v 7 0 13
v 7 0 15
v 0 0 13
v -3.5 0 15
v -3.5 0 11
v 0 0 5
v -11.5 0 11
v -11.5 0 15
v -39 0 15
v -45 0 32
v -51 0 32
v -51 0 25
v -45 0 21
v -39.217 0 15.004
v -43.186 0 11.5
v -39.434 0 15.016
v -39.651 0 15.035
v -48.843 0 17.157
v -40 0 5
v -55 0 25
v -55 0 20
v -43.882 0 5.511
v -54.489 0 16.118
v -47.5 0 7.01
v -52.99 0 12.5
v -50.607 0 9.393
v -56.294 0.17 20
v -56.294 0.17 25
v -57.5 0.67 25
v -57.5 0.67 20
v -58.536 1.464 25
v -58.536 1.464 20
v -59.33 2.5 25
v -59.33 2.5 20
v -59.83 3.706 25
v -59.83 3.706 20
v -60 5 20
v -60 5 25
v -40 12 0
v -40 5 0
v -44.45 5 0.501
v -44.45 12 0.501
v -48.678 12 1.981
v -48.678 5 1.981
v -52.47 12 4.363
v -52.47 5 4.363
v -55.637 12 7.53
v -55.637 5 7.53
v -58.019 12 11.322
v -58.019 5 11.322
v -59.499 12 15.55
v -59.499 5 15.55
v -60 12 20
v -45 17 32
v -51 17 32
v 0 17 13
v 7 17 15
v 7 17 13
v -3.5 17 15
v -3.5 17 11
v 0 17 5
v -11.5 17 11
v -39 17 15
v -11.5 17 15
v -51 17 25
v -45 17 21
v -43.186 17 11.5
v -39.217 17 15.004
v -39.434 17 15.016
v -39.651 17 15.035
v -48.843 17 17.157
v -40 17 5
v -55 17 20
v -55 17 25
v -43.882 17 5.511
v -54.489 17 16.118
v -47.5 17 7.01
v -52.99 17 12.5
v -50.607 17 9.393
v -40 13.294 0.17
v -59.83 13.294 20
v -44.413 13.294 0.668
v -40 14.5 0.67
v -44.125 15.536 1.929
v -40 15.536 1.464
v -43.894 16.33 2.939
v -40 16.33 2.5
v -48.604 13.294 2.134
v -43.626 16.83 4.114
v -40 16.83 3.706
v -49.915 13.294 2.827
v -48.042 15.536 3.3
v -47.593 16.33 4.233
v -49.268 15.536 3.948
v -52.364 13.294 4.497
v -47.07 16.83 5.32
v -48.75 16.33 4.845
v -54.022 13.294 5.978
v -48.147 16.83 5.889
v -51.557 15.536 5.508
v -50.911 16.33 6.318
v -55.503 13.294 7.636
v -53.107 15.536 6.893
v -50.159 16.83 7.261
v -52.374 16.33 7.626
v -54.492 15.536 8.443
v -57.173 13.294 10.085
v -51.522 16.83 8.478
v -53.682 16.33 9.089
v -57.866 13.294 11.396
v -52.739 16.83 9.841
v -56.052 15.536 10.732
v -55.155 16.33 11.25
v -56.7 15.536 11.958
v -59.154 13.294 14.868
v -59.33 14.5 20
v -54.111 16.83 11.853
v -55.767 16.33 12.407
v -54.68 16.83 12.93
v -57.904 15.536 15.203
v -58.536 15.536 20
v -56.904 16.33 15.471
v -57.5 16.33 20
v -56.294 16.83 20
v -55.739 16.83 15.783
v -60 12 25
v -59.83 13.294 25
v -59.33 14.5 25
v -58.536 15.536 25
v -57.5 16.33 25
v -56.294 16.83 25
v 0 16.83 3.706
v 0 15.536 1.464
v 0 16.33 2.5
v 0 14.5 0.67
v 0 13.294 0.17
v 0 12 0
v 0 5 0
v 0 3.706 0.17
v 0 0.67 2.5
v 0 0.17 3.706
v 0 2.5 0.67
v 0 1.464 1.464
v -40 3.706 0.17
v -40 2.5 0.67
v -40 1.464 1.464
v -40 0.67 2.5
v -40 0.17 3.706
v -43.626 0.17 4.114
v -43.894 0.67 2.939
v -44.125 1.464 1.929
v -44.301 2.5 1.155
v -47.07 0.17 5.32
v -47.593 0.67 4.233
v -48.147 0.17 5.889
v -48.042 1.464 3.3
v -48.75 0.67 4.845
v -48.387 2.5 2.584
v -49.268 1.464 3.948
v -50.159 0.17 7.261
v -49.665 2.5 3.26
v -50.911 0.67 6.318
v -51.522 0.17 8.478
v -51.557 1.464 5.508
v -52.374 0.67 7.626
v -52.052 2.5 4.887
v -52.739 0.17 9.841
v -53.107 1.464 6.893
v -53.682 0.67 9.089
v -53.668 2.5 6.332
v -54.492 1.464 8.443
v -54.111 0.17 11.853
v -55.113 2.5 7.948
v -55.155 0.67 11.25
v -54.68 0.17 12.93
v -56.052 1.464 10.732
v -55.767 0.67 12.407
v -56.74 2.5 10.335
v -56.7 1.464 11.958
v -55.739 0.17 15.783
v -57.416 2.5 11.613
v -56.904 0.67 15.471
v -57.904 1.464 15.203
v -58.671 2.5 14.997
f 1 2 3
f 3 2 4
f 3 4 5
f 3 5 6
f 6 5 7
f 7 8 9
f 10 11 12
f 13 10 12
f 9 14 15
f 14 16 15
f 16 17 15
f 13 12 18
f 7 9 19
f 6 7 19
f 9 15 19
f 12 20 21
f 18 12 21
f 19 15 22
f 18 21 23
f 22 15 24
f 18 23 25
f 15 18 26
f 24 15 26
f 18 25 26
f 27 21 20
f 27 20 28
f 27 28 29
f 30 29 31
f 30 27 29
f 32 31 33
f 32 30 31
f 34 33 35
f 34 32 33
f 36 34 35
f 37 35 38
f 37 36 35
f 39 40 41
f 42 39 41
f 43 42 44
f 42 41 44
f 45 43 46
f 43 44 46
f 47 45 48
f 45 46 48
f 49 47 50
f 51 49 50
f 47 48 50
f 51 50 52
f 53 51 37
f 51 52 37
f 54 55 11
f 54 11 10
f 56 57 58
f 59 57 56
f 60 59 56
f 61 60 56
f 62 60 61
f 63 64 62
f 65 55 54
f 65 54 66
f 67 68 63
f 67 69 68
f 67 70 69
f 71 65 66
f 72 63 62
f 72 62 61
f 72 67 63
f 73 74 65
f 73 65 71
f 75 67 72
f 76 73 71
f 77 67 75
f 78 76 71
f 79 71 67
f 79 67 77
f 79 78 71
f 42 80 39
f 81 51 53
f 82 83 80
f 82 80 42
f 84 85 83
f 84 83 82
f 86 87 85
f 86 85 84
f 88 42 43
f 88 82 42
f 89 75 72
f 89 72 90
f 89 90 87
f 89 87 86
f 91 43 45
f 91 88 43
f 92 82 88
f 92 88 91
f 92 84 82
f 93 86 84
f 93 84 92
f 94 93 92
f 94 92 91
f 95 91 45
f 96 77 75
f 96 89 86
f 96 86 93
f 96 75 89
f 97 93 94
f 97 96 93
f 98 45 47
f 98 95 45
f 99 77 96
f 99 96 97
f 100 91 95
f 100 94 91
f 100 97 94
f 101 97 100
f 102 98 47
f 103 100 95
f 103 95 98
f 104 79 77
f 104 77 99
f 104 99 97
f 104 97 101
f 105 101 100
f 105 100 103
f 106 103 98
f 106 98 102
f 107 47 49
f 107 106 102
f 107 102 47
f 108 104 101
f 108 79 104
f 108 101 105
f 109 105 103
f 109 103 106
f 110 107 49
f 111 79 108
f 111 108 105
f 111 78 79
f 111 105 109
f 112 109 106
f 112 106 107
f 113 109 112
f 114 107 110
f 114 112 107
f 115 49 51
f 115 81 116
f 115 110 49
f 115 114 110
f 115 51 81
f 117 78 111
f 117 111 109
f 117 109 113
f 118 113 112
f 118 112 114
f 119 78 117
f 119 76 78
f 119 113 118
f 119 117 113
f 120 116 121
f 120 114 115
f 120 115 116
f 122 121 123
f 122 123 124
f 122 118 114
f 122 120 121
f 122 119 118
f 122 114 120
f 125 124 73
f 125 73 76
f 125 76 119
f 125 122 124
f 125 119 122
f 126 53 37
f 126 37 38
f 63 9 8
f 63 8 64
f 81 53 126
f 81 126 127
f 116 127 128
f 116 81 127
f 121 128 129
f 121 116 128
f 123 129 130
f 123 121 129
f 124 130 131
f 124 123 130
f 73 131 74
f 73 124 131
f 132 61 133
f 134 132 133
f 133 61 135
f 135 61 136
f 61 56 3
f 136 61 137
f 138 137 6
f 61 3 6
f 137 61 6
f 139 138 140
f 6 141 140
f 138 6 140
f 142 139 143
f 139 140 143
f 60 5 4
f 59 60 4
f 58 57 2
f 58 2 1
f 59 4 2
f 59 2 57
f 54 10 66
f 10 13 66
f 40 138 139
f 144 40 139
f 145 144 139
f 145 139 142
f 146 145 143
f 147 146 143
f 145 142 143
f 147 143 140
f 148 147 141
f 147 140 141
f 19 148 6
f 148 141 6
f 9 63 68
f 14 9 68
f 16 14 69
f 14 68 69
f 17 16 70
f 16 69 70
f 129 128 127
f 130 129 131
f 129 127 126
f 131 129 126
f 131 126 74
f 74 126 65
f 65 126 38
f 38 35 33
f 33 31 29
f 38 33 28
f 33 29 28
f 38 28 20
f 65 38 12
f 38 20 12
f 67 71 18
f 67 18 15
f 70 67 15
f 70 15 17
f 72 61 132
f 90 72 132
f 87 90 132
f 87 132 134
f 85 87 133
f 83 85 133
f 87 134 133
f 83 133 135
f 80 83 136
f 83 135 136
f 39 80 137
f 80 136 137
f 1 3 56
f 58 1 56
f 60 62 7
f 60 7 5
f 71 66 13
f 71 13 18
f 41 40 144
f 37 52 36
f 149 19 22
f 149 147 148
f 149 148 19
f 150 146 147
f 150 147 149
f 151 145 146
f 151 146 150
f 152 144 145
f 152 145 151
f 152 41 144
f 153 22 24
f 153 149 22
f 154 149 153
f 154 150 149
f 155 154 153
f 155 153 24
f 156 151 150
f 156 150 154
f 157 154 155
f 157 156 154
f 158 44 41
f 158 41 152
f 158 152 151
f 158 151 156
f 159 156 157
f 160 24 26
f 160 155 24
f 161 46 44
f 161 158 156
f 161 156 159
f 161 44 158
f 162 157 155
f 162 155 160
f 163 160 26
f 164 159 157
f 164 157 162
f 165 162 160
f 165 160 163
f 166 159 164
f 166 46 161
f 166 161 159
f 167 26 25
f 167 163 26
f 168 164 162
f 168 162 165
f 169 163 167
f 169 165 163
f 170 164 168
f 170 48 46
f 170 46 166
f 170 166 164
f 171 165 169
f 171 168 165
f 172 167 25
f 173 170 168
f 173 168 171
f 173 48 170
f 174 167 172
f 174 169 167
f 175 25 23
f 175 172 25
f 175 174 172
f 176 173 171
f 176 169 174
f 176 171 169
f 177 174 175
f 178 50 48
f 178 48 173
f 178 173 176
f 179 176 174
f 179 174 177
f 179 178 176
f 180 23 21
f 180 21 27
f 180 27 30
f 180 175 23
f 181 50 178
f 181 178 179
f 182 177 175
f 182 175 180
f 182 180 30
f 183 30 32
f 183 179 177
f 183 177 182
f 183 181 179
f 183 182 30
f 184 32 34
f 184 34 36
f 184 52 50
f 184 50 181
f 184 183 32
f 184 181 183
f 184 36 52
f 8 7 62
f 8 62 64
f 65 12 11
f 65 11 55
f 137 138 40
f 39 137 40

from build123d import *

# Parameters (mm, degrees)
SALIENTE_EXTRUIR1_DEPTH  = 17
CORTAR_EXTRUIR3_DEPTH    = 40
CORTAR_REVOLUCI_N1_ANGLE = 90
CORTAR_EXTRUIR4_DEPTH    = 10
CORTAR_EXTRUIR5_DEPTH    = 27
CROQUIS15_W              = 6
CROQUIS15_H              = 17
SALIENTE_EXTRUIR2_DEPTH  = 7
CROQUIS16_W              = 2
CROQUIS16_H              = 17
SALIENTE_EXTRUIR3_DEPTH  = 7
CORTAR_EXTRUIR6_START    = -23
CROQUIS17_W              = 8
CROQUIS17_H              = 4
CORTAR_EXTRUIR6_DEPTH    = 23


with BuildPart() as part:
    # Croquis1 → Saliente-Extruir1 (new body)
    with BuildSketch(Plane(origin=(0, 0, 0), x_dir=(1, 0, 0), z_dir=(0, 1, 0))):
        with BuildLine():
            Line((0, 0), (-40, 0))
            ThreePointArc((-40, 0), (-54.142135624, -5.857864376), (-60, -20))
            Line((-60, -20), (-60, -25))
            Line((-60, -25), (0, -25))
            Line((0, -25), (0, 0))
        make_face()
    extrude(amount=SALIENTE_EXTRUIR1_DEPTH)

    # Croquis8 → Cortar-Extruir3 (cut)
    with BuildSketch(Plane(origin=(0, 0, 0), x_dir=(0, 0, -1), z_dir=(1, 0, 0))):
        with BuildLine():
            Line((-5, 0), (0, 0))
            Line((0, 0), (0, 5))
            ThreePointArc((0, 5), (-1.464466094, 1.464466094), (-5, 0))
        make_face()
        with BuildLine():
            Line((0, 12), (0, 17))
            Line((0, 17), (-5, 17))
            ThreePointArc((-5, 17), (-1.464466094, 15.535533906), (0, 12))
        make_face()
    extrude(amount=-CORTAR_EXTRUIR3_DEPTH, mode=Mode.SUBTRACT)

    # Croquis13 → Cortar-Revolución1 (revolve, cut)
    with BuildSketch(Plane(origin=(-40, 0, 0), x_dir=(0, 0, -1), z_dir=(1, 0, 0))):
        with BuildLine():
            Line((-5, 17), (0, 17))
            Line((0, 17), (0, 12))
            ThreePointArc((0, 12), (-1.464466094, 15.535533906), (-5, 17))
        make_face()
        with BuildLine():
            Line((0, 5), (0, 0))
            Line((0, 0), (-5, 0))
            ThreePointArc((-5, 0), (-1.464466094, 1.464466094), (0, 5))
        make_face()
    revolve(axis=Axis((-40, 22.120784126, 20), (0, 1, 0)), revolution_arc=CORTAR_REVOLUCI_N1_ANGLE, mode=Mode.SUBTRACT)

    # Croquis14 → Cortar-Extruir4 (cut)
    with BuildSketch(Plane(origin=(0, 0, 20), x_dir=(-1, 0, 0), z_dir=(0, 0, -1))):
        with BuildLine():
            Line((55, 17), (60, 17))
            Line((60, 17), (60, 12))
            ThreePointArc((60, 12), (58.535533906, 15.535533906), (55, 17))
        make_face()
        with BuildLine():
            Line((60, 5), (60, 0))
            Line((60, 0), (55, 0))
            ThreePointArc((55, 0), (58.535533906, 1.464466094), (60, 5))
        make_face()
    extrude(amount=-CORTAR_EXTRUIR4_DEPTH, mode=Mode.SUBTRACT)

    # Croquis12 → Cortar-Extruir5 (cut)
    with BuildSketch(Plane(origin=(0, 17, 0), x_dir=(1, 0, 0), z_dir=(0, 1, 0))):
        with BuildLine():
            Line((0, -15), (-39, -15))
            ThreePointArc((-39, -15), (-43.242640687, -16.757359313), (-45, -21))
            Line((-45, -21), (-45, -25))
            Line((-45, -25), (0, -25))
            Line((0, -25), (0, -15))
        make_face()
    extrude(amount=-CORTAR_EXTRUIR5_DEPTH, mode=Mode.SUBTRACT)

    # Croquis15 → Saliente-Extruir2 (add)
    with BuildSketch(Plane.XY.offset(25)):
        with Locations((-48, 8.5)):
            Rectangle(CROQUIS15_W, CROQUIS15_H)
    extrude(amount=SALIENTE_EXTRUIR2_DEPTH)

    # Croquis16 → Saliente-Extruir3 (add)
    with BuildSketch(Plane(origin=(0, 0, 0), x_dir=(0, 0, -1), z_dir=(1, 0, 0))):
        with Locations((-14, 8.5)):
            Rectangle(CROQUIS16_W, CROQUIS16_H)
    extrude(amount=SALIENTE_EXTRUIR3_DEPTH)

    # Croquis17 → Cortar-Extruir6 (cut)
    with BuildSketch(Plane.XZ.offset(CORTAR_EXTRUIR6_START)):
        with Locations((-7.5, 13)):
            Rectangle(CROQUIS17_W, CROQUIS17_H)
        with BuildLine():
            Line((-45, 21), (-48.843271123, 17.156728877))
            Line((-48.843271123, 17.156728877), (-43.186416873, 11.499874628))
            Line((-43.186416873, 11.499874628), (-39.650882968, 15.035408533))
            ThreePointArc((-39.650882968, 15.035408533), (-43.466838804, 16.994085486), (-45, 21))
        make_face()
    extrude(amount=CORTAR_EXTRUIR6_DEPTH, mode=Mode.SUBTRACT)


solid = part.part
